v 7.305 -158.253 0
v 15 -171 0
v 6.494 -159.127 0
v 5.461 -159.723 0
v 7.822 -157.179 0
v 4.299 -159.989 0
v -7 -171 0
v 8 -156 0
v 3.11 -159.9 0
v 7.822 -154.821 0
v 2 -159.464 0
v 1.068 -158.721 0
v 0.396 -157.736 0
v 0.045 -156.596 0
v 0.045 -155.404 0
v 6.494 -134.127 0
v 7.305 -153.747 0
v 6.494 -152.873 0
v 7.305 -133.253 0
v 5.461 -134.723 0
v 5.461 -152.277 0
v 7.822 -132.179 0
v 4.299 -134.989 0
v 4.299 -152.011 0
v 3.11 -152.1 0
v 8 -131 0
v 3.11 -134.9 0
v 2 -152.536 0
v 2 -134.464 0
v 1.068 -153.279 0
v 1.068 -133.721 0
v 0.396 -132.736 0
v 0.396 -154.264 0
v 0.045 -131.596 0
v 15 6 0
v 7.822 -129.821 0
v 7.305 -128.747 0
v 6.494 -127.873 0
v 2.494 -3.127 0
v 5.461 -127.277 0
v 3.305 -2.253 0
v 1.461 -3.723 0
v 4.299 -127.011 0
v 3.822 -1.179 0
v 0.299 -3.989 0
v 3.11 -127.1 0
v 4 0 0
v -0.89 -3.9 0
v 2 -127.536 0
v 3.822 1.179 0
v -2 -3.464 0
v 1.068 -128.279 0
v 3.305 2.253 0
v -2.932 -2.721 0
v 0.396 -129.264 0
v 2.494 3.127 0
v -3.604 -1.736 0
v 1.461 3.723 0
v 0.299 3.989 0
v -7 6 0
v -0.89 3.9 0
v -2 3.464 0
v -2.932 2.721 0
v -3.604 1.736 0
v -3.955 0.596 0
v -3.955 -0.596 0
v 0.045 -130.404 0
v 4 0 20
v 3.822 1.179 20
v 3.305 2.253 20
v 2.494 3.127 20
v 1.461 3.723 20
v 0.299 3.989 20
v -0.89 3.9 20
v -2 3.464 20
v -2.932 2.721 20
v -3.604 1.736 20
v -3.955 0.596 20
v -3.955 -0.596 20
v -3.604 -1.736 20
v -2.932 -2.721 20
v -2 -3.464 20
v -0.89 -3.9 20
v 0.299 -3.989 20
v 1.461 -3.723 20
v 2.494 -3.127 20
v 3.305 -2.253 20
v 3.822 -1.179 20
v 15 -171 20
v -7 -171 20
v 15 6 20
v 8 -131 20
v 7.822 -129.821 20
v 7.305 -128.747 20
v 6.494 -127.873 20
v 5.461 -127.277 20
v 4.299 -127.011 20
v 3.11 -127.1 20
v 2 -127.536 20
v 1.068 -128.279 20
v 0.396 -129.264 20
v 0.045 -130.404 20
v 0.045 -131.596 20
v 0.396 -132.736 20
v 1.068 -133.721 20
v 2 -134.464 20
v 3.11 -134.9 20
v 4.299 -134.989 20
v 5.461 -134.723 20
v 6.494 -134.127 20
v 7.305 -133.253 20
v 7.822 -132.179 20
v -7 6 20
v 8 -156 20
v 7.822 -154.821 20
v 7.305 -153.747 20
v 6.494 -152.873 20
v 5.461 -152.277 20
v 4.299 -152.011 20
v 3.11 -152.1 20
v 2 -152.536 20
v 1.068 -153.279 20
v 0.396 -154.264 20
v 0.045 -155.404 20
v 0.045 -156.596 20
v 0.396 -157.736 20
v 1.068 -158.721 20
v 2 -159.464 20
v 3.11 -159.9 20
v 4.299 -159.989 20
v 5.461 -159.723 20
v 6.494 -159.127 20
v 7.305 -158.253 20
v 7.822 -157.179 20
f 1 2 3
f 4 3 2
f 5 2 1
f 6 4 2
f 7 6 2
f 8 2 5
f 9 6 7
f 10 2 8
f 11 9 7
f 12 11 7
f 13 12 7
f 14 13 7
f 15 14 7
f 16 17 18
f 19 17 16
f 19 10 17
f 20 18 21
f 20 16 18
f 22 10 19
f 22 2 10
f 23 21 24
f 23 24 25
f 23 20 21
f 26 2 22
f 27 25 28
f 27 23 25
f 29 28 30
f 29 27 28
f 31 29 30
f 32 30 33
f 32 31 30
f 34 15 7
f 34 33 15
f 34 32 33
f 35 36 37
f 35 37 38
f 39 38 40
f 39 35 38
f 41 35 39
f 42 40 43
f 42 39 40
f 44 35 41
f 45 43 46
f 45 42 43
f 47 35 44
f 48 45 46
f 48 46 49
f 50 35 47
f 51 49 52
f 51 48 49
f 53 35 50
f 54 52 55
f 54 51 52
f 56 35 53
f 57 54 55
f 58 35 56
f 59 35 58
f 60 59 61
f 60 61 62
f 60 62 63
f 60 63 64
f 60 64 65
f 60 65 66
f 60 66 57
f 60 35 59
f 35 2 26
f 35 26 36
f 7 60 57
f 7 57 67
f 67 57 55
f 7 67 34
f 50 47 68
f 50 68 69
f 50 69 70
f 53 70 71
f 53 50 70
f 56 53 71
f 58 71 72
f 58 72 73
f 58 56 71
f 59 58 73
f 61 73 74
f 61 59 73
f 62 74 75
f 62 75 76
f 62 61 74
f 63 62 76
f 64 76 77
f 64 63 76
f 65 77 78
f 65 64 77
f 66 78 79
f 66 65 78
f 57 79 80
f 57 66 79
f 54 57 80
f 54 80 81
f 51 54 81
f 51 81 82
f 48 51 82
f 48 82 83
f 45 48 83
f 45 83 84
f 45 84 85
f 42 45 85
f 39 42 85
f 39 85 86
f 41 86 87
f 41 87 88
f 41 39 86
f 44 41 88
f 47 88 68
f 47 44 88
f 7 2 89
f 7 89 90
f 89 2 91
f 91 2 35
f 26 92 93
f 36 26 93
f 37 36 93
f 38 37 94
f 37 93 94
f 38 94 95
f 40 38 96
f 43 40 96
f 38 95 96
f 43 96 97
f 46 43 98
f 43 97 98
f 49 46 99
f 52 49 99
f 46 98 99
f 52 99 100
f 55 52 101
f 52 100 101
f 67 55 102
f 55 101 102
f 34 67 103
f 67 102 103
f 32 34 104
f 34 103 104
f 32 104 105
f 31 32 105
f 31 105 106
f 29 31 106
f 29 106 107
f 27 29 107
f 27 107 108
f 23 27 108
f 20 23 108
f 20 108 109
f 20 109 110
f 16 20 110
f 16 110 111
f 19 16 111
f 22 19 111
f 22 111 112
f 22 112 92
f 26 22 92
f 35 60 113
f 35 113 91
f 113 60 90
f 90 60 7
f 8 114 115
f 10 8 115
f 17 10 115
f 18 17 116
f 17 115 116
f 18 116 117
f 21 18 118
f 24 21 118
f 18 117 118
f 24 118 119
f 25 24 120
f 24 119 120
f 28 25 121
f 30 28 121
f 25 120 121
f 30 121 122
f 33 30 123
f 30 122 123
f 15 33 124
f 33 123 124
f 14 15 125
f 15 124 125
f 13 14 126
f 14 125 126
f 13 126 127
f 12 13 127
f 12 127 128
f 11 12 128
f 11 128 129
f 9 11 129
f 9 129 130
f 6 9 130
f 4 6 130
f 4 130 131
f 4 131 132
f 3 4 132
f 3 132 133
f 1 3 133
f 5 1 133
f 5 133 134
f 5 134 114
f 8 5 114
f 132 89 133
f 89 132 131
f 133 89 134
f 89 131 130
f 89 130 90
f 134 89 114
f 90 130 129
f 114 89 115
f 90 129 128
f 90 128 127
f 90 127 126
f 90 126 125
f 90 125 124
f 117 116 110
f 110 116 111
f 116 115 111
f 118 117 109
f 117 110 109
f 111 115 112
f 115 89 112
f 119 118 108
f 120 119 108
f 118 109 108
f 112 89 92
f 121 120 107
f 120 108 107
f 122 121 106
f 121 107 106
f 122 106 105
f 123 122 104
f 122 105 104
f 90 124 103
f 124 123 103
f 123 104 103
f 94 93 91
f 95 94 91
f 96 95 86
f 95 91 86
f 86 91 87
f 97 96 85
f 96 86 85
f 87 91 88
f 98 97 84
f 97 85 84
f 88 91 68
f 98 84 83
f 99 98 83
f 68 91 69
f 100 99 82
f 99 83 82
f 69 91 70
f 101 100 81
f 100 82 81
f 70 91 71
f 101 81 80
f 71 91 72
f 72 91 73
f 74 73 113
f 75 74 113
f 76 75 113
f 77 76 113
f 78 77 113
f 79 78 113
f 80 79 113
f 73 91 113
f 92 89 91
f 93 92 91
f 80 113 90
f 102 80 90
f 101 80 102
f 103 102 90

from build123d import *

# Parameters (mm, degrees)
SKETCH_4_R          = 4
EXTRUDE_3_DEPTH     = 20
CUT_EXTRUDE_1_REACH = 174.818
SKETCH_5_R          = 4


with BuildPart() as part:
    # 草图4 → 凸台-拉伸3 (new body)
    with BuildSketch(Plane.XY):
        Polygon((-7, 6), (15, 6), (15, -6), (15, -171), (-7, -171), (-7, -6), align=None)
        Circle(SKETCH_4_R, mode=Mode.SUBTRACT)
    extrude(amount=EXTRUDE_3_DEPTH)

    # 草图5 → 切除-拉伸1 (cut, up to next)
    with BuildSketch(Plane.XY.offset(20), mode=Mode.PRIVATE) as cut_extrude_1_sk1:
        with Locations((4, -131)):
            Circle(SKETCH_5_R)
    cut_extrude_1_tool1 = extrude(cut_extrude_1_sk1.sketch, amount=-CUT_EXTRUDE_1_REACH, mode=Mode.PRIVATE) & part.part
    # 草图5 → 切除-拉伸1 (cut, up to next)
    with BuildSketch(Plane.XY.offset(20), mode=Mode.PRIVATE) as cut_extrude_1_sk2:
        with Locations((4, -156)):
            Circle(SKETCH_5_R)
    cut_extrude_1_tool2 = extrude(cut_extrude_1_sk2.sketch, amount=-CUT_EXTRUDE_1_REACH, mode=Mode.PRIVATE) & part.part
    add(cut_extrude_1_tool1.solids().sort_by_distance((4, -131, 20))[0], mode=Mode.SUBTRACT)
    add(cut_extrude_1_tool2.solids().sort_by_distance((4, -156, 20))[0], mode=Mode.SUBTRACT)


solid = part.part
